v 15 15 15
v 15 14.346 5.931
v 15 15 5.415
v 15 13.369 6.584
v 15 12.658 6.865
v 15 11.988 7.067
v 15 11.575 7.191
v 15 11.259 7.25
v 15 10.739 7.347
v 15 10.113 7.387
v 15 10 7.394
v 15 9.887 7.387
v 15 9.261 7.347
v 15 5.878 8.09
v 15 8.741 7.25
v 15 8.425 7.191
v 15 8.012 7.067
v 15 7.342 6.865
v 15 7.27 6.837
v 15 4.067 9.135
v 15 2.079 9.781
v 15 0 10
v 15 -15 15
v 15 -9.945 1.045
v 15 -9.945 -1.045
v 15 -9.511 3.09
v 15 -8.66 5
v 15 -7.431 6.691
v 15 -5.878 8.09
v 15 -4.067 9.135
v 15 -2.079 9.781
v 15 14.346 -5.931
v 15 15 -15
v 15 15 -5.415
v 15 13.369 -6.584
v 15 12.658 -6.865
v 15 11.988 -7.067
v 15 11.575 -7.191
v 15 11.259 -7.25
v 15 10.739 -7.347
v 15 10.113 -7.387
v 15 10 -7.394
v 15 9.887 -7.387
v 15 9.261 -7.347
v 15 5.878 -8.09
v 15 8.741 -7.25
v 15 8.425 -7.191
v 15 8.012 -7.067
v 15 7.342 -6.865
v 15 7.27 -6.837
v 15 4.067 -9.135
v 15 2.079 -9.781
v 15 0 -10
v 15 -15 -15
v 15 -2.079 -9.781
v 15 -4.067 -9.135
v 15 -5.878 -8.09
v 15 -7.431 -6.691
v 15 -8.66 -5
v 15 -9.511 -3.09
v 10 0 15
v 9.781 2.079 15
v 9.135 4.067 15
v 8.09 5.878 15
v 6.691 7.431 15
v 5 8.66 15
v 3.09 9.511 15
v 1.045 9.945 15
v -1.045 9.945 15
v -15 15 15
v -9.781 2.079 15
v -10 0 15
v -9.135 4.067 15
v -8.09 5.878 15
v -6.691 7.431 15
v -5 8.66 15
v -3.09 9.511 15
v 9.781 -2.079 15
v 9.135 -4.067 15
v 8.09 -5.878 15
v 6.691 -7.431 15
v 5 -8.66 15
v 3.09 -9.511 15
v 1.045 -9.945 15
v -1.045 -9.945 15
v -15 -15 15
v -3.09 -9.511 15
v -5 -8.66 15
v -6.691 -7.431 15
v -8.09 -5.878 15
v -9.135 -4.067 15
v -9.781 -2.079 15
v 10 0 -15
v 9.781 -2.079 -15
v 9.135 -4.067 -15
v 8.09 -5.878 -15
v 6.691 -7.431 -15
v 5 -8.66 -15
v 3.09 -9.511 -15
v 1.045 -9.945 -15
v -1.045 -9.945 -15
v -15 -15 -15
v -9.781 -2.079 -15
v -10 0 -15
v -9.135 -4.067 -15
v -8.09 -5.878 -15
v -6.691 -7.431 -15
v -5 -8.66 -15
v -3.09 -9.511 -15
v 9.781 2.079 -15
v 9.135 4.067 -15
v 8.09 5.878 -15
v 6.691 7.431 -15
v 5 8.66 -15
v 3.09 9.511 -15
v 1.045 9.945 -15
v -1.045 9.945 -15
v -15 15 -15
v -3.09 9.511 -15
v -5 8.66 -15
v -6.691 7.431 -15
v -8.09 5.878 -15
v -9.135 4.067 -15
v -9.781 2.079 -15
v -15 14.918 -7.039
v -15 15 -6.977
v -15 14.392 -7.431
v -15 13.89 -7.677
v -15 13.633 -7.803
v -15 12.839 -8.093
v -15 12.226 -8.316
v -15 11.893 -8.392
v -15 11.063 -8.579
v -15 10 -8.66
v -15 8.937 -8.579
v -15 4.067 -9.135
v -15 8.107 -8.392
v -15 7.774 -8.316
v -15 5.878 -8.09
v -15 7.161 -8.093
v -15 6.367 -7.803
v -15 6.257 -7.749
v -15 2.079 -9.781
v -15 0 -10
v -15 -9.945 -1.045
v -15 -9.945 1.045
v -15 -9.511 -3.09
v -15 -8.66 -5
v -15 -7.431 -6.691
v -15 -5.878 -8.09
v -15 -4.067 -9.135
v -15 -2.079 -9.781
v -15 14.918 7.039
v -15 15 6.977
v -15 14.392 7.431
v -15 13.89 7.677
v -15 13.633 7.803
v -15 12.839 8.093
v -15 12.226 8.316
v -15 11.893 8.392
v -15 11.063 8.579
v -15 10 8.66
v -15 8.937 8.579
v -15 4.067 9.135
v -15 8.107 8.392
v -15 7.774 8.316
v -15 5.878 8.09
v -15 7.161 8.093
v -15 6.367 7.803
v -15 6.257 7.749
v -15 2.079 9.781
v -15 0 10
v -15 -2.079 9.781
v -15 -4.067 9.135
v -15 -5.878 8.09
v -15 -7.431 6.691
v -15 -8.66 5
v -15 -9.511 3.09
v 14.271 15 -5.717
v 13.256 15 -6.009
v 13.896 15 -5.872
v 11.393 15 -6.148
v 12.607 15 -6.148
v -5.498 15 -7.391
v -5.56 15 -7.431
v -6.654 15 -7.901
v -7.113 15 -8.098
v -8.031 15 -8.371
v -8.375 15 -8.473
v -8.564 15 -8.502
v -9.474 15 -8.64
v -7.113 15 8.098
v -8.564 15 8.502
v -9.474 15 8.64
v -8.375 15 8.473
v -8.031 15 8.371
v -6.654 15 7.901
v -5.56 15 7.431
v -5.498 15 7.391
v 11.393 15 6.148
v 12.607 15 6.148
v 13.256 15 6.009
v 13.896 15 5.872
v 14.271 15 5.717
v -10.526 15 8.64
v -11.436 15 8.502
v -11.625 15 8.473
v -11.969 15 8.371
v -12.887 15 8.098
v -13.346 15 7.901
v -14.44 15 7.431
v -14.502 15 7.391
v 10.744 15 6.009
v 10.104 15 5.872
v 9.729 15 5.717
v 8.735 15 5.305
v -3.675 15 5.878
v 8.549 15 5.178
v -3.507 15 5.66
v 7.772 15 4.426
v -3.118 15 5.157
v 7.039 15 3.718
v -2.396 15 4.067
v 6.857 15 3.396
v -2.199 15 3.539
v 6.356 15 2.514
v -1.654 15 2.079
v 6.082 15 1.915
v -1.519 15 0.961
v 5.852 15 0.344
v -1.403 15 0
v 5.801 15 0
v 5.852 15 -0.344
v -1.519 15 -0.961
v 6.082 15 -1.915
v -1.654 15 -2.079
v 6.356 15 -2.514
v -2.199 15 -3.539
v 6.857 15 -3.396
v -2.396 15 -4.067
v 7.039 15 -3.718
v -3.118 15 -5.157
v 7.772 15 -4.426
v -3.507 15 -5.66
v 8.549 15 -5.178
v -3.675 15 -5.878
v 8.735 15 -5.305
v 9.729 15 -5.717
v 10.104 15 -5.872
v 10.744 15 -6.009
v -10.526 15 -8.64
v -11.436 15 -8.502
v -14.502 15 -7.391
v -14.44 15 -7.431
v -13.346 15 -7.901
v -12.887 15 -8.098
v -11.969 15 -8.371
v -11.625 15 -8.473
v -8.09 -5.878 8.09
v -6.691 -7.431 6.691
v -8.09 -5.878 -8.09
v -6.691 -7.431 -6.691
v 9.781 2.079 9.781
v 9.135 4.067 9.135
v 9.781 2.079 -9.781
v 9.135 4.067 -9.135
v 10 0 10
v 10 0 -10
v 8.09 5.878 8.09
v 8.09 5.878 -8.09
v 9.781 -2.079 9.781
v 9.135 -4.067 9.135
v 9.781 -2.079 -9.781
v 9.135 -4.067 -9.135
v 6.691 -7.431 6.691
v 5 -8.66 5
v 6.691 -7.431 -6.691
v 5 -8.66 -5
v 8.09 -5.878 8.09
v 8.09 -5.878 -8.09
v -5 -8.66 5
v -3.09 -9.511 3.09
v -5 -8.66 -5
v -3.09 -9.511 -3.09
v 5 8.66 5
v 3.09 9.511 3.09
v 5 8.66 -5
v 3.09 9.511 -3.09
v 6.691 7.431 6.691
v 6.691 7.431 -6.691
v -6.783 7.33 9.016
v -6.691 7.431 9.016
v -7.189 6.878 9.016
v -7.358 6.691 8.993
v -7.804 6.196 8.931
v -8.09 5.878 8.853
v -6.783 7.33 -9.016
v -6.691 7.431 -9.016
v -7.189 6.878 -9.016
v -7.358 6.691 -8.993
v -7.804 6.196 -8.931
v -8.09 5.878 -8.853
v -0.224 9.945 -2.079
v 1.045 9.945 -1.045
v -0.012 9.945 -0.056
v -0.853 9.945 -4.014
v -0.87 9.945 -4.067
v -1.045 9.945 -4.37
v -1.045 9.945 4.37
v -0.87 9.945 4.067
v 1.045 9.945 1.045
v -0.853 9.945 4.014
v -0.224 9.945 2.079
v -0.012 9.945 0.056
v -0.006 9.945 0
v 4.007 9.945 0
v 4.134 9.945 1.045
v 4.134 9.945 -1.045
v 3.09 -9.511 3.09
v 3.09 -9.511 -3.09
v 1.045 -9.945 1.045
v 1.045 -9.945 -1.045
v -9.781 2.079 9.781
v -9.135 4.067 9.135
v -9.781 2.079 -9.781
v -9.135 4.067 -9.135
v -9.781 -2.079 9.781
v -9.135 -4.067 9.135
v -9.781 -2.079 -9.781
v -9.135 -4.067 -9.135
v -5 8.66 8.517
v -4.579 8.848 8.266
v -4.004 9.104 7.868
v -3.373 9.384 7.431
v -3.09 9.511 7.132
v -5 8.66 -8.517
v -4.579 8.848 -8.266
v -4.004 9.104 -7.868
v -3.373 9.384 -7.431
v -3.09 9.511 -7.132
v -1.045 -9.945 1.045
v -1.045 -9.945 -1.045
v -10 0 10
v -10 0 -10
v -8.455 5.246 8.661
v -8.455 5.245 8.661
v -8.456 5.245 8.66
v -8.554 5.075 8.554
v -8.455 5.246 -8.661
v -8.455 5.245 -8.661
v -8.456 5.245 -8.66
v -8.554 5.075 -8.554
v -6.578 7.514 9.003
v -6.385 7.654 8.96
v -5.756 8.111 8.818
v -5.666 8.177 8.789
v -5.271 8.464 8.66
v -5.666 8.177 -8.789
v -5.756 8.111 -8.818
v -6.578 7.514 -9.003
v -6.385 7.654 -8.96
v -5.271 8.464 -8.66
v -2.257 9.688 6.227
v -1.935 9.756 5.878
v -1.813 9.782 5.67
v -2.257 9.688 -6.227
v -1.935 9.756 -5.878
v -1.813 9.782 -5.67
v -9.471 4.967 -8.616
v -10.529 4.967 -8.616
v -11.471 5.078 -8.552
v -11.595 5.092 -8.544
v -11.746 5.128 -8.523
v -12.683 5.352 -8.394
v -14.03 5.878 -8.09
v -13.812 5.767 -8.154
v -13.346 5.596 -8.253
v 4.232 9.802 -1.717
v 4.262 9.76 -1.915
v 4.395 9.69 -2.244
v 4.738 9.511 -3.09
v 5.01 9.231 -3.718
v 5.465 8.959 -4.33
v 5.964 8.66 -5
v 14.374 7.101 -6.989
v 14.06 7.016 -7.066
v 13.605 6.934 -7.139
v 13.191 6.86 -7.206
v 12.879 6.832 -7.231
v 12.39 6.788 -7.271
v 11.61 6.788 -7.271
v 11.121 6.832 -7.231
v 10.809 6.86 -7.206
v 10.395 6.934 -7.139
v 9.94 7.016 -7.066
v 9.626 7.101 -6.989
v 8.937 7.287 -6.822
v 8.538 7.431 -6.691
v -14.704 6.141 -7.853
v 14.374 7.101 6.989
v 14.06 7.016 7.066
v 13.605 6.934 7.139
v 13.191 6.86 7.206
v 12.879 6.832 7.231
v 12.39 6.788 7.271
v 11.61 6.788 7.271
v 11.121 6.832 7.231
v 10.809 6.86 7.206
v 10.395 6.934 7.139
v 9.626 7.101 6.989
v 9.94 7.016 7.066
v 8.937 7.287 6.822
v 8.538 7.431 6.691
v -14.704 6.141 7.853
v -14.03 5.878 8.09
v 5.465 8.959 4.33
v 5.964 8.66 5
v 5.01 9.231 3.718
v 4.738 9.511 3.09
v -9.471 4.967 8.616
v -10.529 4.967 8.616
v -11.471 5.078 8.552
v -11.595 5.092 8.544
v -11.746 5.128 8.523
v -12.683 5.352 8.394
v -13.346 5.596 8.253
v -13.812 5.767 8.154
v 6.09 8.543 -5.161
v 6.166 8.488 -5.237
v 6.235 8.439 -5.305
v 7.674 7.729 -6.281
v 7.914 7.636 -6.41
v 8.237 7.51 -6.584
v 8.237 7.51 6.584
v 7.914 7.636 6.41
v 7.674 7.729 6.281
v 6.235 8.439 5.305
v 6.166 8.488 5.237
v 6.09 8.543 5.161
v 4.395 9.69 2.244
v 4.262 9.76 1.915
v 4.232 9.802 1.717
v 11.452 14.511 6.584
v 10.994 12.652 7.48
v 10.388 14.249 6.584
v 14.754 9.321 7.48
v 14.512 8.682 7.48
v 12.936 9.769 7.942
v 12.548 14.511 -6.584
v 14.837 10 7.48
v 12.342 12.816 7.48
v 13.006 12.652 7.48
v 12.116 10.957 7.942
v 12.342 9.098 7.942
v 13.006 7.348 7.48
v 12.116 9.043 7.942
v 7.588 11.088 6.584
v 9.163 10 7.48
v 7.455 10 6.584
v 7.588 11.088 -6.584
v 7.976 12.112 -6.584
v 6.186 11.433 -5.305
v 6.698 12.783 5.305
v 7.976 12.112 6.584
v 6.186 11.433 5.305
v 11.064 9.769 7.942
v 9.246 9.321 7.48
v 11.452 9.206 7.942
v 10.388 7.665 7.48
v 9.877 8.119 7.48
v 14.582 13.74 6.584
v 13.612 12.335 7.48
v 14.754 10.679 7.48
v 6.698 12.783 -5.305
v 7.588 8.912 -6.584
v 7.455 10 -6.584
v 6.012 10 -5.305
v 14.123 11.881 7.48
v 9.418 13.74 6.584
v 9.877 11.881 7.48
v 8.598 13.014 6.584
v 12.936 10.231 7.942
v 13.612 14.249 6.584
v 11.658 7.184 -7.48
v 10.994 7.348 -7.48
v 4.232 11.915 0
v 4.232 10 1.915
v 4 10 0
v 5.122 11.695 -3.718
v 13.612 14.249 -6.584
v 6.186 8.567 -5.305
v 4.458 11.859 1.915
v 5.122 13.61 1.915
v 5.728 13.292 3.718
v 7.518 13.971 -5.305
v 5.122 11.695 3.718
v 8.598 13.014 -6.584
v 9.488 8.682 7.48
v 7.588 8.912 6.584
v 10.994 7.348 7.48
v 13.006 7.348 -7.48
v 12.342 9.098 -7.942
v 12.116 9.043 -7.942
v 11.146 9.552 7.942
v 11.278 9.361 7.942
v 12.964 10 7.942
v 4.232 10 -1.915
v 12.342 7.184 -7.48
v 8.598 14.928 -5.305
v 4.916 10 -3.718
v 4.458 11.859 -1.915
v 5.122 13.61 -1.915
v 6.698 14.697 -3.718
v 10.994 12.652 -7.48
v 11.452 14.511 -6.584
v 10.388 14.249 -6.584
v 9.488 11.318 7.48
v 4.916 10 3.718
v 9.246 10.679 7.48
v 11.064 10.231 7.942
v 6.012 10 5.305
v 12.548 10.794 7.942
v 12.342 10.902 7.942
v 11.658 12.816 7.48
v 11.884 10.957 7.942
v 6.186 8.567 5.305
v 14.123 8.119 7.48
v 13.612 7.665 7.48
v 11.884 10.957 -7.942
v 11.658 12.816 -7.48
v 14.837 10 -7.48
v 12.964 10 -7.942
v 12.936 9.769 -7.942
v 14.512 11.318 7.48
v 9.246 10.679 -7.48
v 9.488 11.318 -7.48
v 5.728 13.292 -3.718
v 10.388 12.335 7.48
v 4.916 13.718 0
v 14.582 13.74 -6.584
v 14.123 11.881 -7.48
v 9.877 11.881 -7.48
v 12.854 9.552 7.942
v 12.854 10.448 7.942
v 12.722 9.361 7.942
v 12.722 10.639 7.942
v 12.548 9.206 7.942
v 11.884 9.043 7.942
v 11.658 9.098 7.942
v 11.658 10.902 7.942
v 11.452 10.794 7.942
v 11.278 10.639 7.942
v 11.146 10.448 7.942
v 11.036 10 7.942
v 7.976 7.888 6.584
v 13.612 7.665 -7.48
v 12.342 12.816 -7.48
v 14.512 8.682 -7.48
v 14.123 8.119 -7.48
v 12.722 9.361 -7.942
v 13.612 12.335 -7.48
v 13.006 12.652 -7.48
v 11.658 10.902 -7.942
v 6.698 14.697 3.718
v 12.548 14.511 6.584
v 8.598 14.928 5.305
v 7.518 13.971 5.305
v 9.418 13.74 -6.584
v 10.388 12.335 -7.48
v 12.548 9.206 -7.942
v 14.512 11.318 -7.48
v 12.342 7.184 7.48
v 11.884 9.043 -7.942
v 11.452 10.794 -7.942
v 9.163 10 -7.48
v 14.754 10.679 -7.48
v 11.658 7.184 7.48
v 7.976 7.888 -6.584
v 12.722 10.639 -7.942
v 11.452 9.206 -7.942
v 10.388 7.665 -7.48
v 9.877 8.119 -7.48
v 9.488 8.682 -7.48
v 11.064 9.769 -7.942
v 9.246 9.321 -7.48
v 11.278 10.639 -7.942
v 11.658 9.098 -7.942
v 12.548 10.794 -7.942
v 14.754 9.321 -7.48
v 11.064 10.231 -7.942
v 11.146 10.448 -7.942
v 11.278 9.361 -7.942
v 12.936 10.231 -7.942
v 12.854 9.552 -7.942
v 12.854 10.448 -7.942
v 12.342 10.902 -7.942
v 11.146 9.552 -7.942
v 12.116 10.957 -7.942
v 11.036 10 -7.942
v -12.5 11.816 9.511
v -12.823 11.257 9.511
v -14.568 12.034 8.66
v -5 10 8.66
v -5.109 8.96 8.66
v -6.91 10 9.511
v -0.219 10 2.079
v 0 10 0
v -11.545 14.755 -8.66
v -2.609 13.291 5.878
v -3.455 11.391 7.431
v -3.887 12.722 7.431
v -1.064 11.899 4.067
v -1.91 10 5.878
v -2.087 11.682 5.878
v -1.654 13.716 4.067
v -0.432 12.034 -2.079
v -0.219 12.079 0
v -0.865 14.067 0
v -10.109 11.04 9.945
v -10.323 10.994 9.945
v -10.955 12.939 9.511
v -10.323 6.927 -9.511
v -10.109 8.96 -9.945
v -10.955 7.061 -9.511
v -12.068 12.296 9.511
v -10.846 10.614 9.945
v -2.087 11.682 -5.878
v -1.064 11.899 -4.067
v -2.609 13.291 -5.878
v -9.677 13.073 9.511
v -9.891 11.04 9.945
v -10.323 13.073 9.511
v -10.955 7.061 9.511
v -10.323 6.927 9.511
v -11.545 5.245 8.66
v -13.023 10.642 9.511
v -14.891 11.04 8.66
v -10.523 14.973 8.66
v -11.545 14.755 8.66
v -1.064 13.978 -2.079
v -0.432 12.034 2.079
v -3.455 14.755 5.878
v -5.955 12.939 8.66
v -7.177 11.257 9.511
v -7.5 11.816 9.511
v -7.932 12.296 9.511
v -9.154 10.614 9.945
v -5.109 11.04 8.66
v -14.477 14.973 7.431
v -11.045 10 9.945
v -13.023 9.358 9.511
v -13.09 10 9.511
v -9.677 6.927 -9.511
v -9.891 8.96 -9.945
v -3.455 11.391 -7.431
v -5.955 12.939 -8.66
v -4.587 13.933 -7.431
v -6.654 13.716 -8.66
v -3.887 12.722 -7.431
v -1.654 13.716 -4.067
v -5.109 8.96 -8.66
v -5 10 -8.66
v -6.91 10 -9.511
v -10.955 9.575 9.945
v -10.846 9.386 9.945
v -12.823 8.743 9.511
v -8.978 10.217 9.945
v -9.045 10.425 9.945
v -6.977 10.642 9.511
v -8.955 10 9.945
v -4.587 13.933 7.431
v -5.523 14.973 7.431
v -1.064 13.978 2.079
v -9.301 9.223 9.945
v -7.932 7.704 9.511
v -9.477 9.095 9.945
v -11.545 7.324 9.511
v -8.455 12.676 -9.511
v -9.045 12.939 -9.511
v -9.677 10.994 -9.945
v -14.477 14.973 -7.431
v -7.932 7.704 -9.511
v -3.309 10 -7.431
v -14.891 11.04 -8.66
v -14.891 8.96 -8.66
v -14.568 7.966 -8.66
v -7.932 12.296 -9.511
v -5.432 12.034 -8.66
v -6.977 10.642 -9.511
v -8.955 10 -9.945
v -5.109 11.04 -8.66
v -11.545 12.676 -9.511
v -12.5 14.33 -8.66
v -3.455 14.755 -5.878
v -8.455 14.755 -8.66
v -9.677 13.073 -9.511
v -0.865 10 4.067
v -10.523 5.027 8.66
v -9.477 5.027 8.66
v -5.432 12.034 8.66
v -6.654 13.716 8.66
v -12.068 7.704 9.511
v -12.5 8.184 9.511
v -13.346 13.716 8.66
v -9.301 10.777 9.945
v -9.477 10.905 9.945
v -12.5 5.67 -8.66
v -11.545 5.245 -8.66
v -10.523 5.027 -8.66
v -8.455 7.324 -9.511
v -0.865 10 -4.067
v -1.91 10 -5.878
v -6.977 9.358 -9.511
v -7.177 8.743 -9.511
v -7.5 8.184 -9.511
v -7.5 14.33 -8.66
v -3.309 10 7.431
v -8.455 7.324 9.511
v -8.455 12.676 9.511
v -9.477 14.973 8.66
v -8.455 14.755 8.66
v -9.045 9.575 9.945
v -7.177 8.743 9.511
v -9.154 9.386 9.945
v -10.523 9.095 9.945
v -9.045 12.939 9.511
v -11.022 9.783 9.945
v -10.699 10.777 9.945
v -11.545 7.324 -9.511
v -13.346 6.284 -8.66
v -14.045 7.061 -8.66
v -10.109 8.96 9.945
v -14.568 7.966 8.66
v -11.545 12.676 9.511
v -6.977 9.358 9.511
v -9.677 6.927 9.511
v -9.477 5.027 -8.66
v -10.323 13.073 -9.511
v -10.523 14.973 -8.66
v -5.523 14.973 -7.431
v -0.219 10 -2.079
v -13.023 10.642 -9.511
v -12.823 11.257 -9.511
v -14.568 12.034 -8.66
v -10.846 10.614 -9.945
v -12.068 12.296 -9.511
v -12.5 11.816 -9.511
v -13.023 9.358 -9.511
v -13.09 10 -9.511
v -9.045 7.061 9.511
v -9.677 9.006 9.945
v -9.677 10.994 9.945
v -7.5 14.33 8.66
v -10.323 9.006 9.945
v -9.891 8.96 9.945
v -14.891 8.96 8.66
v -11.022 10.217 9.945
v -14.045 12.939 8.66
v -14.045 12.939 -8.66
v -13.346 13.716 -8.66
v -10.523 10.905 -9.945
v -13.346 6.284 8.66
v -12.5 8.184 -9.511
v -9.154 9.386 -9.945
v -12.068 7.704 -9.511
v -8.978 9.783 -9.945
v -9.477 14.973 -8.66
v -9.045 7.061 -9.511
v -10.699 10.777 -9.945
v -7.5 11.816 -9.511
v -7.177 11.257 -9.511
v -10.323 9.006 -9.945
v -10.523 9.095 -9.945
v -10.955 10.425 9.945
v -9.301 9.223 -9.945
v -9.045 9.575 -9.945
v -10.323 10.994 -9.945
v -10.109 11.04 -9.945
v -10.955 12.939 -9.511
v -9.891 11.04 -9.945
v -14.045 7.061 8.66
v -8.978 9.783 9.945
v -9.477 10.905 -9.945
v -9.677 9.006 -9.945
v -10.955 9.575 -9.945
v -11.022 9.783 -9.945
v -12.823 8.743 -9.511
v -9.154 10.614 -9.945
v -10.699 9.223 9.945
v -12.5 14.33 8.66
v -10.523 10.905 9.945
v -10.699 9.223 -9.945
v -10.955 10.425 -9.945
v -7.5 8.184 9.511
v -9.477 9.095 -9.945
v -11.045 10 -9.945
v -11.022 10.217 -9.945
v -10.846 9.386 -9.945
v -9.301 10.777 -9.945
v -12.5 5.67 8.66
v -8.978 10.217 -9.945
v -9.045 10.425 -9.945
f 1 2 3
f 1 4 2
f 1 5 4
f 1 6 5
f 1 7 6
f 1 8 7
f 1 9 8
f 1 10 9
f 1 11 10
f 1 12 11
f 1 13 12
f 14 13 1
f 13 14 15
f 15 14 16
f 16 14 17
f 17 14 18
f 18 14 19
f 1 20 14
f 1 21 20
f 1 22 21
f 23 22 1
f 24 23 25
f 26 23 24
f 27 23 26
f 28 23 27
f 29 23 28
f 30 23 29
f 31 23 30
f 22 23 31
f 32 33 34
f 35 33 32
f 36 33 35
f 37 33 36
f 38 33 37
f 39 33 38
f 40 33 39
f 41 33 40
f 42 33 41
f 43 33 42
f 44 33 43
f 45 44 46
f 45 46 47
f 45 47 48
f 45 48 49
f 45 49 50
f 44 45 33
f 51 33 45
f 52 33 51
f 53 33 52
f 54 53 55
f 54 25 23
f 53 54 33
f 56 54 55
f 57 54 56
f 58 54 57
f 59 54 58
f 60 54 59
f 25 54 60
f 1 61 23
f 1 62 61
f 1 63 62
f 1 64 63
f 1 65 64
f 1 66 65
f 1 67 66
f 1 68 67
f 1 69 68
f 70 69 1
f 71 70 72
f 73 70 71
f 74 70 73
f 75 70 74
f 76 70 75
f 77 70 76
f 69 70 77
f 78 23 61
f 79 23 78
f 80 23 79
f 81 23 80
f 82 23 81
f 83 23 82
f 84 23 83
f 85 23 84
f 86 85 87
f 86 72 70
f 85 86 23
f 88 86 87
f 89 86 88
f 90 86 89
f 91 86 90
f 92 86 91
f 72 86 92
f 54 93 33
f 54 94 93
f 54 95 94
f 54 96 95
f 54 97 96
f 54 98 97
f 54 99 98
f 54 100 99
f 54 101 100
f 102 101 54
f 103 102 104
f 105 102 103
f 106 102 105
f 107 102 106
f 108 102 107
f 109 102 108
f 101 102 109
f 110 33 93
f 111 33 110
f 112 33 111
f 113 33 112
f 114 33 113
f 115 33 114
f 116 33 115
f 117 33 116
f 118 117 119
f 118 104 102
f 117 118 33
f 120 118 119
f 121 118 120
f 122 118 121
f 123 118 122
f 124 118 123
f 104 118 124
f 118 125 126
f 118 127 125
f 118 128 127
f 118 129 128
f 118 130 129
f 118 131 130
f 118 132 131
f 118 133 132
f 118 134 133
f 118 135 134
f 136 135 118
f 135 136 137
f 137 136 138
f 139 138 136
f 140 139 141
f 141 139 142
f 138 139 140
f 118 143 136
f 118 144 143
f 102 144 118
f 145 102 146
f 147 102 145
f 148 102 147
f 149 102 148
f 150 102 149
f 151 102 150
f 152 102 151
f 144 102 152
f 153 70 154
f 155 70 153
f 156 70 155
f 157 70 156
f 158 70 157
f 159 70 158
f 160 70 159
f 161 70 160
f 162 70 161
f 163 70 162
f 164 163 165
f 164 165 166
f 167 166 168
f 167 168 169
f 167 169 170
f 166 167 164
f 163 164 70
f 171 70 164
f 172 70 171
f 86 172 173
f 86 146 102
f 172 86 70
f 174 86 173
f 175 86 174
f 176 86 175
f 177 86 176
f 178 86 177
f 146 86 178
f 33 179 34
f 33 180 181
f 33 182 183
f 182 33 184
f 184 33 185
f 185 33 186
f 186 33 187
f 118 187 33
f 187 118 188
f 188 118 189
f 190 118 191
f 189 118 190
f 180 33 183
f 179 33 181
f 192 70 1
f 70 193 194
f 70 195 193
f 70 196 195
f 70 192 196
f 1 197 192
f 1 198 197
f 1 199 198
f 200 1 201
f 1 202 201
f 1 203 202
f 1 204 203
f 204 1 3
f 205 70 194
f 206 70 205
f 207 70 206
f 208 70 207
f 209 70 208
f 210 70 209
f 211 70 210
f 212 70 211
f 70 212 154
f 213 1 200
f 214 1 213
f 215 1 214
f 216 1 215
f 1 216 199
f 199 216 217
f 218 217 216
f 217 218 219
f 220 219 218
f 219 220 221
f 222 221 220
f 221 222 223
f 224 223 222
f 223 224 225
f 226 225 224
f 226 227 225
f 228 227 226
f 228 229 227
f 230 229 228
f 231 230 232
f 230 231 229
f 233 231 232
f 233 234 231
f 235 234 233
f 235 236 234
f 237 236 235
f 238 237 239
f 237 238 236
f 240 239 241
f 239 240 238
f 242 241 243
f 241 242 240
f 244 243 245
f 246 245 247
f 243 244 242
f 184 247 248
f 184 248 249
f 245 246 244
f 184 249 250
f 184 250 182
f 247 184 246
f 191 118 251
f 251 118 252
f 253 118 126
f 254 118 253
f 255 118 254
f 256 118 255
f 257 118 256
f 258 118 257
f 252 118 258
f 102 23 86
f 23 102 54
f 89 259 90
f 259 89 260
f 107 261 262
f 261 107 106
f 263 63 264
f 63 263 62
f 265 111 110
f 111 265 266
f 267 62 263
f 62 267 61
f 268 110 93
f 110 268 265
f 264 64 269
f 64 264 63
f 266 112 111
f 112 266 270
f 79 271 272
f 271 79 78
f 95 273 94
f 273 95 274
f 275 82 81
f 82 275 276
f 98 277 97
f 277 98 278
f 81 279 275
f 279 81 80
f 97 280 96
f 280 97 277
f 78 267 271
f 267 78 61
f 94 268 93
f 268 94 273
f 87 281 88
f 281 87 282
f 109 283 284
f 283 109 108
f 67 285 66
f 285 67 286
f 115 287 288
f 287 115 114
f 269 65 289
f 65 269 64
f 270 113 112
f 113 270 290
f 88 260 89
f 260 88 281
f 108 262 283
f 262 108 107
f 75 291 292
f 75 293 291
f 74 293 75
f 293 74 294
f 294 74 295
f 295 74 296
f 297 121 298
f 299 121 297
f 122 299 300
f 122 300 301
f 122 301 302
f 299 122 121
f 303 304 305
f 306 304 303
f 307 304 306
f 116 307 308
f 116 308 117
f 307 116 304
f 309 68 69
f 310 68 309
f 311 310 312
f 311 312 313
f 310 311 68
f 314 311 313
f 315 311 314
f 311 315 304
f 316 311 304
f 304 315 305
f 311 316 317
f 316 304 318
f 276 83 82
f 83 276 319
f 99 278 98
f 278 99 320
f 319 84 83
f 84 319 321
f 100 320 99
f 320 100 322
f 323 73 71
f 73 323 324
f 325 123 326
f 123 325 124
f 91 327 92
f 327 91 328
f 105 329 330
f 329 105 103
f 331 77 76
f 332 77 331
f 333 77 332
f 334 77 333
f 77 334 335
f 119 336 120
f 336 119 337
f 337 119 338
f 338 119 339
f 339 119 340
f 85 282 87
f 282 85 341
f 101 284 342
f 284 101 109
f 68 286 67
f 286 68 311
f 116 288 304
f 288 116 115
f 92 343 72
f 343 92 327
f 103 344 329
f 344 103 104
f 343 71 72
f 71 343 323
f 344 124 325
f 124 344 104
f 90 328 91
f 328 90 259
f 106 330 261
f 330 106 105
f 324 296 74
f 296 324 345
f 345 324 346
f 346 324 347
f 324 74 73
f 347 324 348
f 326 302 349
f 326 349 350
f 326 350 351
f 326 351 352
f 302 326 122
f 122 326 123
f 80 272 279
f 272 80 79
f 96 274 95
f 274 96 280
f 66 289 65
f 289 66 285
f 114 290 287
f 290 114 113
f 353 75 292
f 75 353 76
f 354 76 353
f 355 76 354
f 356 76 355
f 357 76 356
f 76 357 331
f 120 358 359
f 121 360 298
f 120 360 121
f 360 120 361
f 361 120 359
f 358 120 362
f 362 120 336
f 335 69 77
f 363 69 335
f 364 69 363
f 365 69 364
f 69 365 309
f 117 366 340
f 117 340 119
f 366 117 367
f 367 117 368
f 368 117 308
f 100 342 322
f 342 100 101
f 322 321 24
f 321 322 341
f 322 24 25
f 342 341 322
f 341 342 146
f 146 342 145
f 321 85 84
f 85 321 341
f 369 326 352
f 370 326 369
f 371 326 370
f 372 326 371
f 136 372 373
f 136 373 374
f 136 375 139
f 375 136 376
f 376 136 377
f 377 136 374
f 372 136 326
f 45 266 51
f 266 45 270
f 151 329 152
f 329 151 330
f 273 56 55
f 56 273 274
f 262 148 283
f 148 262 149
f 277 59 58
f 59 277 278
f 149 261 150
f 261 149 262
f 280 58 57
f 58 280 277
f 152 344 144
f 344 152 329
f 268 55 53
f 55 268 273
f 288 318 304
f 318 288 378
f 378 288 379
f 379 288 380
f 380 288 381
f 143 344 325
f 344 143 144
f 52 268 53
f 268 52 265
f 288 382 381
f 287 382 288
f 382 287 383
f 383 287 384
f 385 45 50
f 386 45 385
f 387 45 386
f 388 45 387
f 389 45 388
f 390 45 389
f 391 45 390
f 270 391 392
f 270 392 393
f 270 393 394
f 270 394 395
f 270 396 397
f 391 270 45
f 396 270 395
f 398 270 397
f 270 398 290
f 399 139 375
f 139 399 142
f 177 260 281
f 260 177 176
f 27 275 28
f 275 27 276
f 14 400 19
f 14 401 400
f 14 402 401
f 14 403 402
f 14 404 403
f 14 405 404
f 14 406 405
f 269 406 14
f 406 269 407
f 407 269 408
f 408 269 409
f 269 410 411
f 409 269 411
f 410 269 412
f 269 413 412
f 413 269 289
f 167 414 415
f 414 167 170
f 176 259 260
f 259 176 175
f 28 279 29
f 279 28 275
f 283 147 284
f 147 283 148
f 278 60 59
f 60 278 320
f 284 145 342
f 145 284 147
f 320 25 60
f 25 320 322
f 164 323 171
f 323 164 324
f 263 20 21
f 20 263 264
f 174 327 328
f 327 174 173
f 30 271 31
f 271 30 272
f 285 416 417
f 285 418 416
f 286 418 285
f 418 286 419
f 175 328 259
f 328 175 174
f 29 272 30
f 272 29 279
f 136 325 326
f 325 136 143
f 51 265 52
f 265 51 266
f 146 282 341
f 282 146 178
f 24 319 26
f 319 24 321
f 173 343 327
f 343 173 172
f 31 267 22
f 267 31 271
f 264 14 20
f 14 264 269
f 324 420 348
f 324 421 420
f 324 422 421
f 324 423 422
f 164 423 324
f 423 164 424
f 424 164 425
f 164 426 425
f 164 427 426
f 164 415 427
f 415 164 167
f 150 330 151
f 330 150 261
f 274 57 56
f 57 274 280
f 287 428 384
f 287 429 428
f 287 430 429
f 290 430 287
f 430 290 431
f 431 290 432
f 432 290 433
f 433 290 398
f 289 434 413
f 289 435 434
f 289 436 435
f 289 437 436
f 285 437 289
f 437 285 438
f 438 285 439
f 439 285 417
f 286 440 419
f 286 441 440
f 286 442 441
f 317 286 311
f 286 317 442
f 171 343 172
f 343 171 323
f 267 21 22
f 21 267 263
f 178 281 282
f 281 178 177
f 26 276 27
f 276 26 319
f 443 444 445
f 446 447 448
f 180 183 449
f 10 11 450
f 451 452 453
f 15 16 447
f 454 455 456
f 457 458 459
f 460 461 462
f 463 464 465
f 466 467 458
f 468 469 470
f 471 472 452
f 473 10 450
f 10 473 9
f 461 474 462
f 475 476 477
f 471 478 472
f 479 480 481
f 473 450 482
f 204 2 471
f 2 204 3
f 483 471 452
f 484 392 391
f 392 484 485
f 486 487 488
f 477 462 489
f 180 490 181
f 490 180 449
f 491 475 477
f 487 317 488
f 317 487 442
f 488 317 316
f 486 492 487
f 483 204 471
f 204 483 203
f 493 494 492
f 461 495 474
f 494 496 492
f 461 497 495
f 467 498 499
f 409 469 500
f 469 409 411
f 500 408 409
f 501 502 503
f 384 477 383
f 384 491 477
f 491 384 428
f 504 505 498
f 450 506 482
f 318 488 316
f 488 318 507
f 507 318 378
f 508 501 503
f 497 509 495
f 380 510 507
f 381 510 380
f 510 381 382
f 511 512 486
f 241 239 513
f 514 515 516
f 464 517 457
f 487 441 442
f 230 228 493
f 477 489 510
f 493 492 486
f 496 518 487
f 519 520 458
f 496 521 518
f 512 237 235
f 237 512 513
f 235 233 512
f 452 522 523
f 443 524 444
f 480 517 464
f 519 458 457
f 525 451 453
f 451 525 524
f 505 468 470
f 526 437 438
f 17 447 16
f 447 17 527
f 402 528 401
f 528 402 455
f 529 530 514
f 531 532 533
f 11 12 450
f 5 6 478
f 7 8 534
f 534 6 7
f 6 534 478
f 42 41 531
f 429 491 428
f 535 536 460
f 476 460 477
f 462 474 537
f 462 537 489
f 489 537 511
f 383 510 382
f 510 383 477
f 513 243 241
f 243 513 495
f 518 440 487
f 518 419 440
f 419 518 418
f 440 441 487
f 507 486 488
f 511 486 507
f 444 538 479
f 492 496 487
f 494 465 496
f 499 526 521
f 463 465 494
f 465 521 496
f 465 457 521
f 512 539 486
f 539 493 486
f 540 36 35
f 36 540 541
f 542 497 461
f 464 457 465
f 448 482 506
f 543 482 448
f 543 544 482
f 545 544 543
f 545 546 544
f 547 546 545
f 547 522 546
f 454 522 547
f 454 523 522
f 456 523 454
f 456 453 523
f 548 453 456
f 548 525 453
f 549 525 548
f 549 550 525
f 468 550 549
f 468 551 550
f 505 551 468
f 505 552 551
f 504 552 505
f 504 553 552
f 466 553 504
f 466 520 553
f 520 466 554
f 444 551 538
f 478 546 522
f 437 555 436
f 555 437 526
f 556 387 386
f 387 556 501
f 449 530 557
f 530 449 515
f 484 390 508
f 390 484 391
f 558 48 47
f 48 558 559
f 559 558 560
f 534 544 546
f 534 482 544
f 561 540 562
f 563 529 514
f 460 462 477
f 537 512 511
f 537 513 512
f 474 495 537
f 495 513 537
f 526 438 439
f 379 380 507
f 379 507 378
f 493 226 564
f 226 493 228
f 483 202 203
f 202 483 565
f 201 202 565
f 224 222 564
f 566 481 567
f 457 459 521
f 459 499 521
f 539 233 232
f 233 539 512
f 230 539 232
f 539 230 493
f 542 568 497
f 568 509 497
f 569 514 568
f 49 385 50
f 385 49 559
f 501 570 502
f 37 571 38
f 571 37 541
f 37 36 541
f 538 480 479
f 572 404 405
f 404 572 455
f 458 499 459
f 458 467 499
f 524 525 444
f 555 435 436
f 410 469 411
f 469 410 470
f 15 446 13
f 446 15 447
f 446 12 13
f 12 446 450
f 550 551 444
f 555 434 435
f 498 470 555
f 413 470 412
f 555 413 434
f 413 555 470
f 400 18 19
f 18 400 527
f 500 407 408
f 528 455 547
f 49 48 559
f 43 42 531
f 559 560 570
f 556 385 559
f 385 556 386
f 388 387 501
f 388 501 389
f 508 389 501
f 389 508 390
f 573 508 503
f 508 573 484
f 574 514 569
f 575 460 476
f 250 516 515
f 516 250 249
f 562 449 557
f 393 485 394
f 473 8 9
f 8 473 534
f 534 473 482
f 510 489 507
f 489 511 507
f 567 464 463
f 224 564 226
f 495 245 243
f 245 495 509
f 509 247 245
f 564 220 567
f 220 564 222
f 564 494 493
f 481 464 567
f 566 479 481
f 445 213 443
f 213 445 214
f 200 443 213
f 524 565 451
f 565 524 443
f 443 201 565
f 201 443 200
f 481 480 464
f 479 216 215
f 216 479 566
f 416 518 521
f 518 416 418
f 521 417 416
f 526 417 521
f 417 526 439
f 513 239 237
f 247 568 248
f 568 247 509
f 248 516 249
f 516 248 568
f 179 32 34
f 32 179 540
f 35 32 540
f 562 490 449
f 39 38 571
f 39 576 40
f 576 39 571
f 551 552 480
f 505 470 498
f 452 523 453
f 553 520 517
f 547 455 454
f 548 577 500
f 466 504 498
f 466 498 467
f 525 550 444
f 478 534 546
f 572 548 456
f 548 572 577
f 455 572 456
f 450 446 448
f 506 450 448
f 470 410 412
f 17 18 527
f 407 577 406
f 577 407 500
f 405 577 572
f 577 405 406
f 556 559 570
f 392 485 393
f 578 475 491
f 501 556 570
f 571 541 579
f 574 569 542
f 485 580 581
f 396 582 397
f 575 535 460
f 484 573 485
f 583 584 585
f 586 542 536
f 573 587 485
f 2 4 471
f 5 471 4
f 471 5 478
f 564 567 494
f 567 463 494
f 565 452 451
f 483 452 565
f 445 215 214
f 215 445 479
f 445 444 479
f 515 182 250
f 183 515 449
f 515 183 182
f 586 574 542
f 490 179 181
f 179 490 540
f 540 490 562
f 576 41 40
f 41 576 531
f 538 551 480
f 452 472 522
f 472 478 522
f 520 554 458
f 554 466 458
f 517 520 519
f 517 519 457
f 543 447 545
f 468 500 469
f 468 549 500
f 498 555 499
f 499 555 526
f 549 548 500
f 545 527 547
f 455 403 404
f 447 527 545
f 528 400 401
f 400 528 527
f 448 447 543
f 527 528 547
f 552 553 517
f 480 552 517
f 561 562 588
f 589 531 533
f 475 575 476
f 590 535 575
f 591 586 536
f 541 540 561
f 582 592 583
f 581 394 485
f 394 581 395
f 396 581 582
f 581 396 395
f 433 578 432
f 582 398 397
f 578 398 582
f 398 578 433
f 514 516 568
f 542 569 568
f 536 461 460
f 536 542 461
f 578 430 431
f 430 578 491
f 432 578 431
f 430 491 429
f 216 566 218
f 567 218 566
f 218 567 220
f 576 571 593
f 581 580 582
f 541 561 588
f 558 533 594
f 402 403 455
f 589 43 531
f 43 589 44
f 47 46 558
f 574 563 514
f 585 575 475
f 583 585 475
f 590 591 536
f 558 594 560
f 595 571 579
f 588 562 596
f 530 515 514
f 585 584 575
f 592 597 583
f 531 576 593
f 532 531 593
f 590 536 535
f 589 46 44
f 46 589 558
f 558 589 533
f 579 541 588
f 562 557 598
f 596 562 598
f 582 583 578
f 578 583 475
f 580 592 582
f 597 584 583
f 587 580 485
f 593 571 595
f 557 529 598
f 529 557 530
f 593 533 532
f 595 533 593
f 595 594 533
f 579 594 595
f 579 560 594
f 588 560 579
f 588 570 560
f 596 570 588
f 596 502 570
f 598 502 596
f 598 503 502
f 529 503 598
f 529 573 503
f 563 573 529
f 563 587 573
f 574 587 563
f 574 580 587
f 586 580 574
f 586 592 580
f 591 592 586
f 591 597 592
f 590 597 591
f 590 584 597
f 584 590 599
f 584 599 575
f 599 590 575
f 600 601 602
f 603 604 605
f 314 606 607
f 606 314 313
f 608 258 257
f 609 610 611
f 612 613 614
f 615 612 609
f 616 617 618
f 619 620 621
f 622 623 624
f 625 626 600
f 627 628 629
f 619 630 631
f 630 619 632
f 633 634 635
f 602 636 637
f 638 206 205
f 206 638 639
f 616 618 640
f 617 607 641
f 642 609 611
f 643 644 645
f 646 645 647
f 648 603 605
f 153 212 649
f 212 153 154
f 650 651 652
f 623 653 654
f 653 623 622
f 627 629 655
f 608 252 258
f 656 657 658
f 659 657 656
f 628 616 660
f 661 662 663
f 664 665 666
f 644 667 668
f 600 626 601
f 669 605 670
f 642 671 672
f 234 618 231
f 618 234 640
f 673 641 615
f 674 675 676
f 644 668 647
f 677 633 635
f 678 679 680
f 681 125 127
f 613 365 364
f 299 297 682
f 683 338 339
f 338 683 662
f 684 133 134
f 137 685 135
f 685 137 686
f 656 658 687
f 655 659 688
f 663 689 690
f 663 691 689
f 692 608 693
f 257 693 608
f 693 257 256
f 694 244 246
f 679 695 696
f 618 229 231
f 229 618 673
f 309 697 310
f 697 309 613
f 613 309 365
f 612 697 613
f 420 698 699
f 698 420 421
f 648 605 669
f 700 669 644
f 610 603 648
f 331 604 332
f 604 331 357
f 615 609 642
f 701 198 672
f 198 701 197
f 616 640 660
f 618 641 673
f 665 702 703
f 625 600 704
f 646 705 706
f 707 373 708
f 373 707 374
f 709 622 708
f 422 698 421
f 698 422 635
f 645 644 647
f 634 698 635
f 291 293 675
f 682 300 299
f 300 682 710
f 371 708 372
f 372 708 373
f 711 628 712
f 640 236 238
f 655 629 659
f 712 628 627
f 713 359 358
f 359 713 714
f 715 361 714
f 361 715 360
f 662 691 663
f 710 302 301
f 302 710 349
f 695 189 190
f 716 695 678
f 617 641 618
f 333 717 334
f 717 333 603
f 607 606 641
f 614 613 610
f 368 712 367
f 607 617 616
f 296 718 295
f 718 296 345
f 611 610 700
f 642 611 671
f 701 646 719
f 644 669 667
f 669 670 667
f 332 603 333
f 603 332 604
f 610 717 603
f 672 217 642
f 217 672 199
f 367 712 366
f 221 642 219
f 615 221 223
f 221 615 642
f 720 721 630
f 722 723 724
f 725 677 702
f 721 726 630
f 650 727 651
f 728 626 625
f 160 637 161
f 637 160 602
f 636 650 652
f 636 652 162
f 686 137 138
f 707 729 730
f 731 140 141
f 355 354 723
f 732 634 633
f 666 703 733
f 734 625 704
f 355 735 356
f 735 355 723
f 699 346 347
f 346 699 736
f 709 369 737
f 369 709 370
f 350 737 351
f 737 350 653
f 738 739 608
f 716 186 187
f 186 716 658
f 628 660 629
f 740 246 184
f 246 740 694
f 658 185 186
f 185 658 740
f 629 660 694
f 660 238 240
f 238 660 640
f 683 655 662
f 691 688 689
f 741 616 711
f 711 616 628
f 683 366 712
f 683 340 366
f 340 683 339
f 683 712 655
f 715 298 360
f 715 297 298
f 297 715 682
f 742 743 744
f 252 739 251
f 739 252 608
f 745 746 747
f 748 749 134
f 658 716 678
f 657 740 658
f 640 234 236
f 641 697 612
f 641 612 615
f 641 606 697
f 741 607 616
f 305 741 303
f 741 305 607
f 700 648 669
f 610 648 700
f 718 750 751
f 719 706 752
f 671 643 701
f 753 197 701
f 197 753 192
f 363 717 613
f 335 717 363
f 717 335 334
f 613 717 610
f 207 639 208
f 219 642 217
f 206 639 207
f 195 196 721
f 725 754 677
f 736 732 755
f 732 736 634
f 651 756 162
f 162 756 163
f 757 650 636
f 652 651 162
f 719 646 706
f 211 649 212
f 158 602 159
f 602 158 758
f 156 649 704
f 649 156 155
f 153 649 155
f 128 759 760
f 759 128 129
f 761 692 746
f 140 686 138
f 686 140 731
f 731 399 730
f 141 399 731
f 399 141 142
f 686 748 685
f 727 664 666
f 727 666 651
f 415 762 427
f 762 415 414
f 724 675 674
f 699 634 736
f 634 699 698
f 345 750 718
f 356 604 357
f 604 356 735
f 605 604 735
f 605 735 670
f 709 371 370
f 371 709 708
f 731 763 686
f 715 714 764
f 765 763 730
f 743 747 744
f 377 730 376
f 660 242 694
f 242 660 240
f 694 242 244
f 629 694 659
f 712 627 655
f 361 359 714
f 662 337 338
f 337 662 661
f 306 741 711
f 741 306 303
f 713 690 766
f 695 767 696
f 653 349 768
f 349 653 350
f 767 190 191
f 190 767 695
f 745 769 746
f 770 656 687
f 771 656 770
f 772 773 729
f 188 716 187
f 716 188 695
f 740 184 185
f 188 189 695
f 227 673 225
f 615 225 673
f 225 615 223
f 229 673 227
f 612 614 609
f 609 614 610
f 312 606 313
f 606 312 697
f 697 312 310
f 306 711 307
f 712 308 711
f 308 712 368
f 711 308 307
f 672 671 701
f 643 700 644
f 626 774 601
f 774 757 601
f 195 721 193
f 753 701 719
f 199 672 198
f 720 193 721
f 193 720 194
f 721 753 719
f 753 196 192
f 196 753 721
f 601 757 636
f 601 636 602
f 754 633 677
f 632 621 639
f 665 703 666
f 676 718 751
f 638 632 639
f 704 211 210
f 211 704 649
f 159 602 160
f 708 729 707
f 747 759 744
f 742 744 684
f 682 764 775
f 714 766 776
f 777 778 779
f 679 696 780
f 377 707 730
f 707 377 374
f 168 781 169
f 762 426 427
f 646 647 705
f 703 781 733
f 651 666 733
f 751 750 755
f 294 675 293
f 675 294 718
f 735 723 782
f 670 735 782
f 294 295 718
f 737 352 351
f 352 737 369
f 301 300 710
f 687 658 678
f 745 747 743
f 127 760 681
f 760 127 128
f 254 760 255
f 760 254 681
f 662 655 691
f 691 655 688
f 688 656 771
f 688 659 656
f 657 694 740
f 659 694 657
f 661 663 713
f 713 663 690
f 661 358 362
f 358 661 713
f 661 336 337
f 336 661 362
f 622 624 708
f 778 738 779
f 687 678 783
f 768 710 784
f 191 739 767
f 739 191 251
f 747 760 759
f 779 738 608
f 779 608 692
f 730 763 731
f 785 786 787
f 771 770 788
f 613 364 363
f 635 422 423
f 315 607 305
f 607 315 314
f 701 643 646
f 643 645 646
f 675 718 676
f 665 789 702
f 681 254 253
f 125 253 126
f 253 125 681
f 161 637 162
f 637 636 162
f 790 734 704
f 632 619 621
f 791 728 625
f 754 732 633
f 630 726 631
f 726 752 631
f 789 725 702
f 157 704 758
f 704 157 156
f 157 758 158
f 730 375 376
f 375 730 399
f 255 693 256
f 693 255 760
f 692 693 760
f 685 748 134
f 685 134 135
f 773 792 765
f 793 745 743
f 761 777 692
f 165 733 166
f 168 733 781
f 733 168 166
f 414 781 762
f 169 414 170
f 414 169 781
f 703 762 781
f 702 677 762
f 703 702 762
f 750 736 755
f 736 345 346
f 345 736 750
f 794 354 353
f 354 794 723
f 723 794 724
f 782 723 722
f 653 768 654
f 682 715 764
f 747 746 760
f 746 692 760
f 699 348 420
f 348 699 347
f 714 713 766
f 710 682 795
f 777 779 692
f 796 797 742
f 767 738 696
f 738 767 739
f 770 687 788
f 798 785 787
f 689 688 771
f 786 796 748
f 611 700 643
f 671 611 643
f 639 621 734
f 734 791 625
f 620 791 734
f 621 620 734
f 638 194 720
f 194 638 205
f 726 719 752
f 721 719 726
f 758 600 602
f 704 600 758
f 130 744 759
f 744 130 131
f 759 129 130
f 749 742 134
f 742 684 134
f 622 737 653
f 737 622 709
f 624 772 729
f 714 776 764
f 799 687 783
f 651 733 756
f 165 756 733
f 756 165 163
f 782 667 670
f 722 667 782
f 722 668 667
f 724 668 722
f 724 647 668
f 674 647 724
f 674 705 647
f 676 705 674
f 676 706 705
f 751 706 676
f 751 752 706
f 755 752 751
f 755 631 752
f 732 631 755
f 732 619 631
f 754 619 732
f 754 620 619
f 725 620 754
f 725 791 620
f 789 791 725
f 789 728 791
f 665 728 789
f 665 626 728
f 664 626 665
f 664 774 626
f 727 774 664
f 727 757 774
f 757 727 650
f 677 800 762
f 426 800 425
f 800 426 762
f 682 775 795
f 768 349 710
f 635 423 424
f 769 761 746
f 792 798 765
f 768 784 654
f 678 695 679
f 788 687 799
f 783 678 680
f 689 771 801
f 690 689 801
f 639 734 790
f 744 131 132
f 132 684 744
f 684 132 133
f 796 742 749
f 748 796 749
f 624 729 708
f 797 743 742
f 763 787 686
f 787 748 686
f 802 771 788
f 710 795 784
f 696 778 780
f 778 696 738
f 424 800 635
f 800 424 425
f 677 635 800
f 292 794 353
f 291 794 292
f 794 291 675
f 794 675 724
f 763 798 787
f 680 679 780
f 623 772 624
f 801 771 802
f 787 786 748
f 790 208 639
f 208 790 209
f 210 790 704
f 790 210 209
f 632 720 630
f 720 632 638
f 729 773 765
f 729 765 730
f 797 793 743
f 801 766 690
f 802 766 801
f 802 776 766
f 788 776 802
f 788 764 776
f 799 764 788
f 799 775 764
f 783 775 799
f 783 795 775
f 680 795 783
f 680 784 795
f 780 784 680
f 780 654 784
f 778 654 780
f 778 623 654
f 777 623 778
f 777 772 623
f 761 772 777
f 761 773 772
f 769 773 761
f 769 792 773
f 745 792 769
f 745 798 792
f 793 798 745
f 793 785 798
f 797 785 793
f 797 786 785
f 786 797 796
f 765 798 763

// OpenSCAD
difference(){
cube(size=30,center=true);
cylinder(h=40,r=10,center=true);
rotate([0,90,0]) cylinder(h=40,r=10,center=true);
translate([12,10,0]) sphere(r=8);
translate([-10,10,0]) sphere(r=10);
}
